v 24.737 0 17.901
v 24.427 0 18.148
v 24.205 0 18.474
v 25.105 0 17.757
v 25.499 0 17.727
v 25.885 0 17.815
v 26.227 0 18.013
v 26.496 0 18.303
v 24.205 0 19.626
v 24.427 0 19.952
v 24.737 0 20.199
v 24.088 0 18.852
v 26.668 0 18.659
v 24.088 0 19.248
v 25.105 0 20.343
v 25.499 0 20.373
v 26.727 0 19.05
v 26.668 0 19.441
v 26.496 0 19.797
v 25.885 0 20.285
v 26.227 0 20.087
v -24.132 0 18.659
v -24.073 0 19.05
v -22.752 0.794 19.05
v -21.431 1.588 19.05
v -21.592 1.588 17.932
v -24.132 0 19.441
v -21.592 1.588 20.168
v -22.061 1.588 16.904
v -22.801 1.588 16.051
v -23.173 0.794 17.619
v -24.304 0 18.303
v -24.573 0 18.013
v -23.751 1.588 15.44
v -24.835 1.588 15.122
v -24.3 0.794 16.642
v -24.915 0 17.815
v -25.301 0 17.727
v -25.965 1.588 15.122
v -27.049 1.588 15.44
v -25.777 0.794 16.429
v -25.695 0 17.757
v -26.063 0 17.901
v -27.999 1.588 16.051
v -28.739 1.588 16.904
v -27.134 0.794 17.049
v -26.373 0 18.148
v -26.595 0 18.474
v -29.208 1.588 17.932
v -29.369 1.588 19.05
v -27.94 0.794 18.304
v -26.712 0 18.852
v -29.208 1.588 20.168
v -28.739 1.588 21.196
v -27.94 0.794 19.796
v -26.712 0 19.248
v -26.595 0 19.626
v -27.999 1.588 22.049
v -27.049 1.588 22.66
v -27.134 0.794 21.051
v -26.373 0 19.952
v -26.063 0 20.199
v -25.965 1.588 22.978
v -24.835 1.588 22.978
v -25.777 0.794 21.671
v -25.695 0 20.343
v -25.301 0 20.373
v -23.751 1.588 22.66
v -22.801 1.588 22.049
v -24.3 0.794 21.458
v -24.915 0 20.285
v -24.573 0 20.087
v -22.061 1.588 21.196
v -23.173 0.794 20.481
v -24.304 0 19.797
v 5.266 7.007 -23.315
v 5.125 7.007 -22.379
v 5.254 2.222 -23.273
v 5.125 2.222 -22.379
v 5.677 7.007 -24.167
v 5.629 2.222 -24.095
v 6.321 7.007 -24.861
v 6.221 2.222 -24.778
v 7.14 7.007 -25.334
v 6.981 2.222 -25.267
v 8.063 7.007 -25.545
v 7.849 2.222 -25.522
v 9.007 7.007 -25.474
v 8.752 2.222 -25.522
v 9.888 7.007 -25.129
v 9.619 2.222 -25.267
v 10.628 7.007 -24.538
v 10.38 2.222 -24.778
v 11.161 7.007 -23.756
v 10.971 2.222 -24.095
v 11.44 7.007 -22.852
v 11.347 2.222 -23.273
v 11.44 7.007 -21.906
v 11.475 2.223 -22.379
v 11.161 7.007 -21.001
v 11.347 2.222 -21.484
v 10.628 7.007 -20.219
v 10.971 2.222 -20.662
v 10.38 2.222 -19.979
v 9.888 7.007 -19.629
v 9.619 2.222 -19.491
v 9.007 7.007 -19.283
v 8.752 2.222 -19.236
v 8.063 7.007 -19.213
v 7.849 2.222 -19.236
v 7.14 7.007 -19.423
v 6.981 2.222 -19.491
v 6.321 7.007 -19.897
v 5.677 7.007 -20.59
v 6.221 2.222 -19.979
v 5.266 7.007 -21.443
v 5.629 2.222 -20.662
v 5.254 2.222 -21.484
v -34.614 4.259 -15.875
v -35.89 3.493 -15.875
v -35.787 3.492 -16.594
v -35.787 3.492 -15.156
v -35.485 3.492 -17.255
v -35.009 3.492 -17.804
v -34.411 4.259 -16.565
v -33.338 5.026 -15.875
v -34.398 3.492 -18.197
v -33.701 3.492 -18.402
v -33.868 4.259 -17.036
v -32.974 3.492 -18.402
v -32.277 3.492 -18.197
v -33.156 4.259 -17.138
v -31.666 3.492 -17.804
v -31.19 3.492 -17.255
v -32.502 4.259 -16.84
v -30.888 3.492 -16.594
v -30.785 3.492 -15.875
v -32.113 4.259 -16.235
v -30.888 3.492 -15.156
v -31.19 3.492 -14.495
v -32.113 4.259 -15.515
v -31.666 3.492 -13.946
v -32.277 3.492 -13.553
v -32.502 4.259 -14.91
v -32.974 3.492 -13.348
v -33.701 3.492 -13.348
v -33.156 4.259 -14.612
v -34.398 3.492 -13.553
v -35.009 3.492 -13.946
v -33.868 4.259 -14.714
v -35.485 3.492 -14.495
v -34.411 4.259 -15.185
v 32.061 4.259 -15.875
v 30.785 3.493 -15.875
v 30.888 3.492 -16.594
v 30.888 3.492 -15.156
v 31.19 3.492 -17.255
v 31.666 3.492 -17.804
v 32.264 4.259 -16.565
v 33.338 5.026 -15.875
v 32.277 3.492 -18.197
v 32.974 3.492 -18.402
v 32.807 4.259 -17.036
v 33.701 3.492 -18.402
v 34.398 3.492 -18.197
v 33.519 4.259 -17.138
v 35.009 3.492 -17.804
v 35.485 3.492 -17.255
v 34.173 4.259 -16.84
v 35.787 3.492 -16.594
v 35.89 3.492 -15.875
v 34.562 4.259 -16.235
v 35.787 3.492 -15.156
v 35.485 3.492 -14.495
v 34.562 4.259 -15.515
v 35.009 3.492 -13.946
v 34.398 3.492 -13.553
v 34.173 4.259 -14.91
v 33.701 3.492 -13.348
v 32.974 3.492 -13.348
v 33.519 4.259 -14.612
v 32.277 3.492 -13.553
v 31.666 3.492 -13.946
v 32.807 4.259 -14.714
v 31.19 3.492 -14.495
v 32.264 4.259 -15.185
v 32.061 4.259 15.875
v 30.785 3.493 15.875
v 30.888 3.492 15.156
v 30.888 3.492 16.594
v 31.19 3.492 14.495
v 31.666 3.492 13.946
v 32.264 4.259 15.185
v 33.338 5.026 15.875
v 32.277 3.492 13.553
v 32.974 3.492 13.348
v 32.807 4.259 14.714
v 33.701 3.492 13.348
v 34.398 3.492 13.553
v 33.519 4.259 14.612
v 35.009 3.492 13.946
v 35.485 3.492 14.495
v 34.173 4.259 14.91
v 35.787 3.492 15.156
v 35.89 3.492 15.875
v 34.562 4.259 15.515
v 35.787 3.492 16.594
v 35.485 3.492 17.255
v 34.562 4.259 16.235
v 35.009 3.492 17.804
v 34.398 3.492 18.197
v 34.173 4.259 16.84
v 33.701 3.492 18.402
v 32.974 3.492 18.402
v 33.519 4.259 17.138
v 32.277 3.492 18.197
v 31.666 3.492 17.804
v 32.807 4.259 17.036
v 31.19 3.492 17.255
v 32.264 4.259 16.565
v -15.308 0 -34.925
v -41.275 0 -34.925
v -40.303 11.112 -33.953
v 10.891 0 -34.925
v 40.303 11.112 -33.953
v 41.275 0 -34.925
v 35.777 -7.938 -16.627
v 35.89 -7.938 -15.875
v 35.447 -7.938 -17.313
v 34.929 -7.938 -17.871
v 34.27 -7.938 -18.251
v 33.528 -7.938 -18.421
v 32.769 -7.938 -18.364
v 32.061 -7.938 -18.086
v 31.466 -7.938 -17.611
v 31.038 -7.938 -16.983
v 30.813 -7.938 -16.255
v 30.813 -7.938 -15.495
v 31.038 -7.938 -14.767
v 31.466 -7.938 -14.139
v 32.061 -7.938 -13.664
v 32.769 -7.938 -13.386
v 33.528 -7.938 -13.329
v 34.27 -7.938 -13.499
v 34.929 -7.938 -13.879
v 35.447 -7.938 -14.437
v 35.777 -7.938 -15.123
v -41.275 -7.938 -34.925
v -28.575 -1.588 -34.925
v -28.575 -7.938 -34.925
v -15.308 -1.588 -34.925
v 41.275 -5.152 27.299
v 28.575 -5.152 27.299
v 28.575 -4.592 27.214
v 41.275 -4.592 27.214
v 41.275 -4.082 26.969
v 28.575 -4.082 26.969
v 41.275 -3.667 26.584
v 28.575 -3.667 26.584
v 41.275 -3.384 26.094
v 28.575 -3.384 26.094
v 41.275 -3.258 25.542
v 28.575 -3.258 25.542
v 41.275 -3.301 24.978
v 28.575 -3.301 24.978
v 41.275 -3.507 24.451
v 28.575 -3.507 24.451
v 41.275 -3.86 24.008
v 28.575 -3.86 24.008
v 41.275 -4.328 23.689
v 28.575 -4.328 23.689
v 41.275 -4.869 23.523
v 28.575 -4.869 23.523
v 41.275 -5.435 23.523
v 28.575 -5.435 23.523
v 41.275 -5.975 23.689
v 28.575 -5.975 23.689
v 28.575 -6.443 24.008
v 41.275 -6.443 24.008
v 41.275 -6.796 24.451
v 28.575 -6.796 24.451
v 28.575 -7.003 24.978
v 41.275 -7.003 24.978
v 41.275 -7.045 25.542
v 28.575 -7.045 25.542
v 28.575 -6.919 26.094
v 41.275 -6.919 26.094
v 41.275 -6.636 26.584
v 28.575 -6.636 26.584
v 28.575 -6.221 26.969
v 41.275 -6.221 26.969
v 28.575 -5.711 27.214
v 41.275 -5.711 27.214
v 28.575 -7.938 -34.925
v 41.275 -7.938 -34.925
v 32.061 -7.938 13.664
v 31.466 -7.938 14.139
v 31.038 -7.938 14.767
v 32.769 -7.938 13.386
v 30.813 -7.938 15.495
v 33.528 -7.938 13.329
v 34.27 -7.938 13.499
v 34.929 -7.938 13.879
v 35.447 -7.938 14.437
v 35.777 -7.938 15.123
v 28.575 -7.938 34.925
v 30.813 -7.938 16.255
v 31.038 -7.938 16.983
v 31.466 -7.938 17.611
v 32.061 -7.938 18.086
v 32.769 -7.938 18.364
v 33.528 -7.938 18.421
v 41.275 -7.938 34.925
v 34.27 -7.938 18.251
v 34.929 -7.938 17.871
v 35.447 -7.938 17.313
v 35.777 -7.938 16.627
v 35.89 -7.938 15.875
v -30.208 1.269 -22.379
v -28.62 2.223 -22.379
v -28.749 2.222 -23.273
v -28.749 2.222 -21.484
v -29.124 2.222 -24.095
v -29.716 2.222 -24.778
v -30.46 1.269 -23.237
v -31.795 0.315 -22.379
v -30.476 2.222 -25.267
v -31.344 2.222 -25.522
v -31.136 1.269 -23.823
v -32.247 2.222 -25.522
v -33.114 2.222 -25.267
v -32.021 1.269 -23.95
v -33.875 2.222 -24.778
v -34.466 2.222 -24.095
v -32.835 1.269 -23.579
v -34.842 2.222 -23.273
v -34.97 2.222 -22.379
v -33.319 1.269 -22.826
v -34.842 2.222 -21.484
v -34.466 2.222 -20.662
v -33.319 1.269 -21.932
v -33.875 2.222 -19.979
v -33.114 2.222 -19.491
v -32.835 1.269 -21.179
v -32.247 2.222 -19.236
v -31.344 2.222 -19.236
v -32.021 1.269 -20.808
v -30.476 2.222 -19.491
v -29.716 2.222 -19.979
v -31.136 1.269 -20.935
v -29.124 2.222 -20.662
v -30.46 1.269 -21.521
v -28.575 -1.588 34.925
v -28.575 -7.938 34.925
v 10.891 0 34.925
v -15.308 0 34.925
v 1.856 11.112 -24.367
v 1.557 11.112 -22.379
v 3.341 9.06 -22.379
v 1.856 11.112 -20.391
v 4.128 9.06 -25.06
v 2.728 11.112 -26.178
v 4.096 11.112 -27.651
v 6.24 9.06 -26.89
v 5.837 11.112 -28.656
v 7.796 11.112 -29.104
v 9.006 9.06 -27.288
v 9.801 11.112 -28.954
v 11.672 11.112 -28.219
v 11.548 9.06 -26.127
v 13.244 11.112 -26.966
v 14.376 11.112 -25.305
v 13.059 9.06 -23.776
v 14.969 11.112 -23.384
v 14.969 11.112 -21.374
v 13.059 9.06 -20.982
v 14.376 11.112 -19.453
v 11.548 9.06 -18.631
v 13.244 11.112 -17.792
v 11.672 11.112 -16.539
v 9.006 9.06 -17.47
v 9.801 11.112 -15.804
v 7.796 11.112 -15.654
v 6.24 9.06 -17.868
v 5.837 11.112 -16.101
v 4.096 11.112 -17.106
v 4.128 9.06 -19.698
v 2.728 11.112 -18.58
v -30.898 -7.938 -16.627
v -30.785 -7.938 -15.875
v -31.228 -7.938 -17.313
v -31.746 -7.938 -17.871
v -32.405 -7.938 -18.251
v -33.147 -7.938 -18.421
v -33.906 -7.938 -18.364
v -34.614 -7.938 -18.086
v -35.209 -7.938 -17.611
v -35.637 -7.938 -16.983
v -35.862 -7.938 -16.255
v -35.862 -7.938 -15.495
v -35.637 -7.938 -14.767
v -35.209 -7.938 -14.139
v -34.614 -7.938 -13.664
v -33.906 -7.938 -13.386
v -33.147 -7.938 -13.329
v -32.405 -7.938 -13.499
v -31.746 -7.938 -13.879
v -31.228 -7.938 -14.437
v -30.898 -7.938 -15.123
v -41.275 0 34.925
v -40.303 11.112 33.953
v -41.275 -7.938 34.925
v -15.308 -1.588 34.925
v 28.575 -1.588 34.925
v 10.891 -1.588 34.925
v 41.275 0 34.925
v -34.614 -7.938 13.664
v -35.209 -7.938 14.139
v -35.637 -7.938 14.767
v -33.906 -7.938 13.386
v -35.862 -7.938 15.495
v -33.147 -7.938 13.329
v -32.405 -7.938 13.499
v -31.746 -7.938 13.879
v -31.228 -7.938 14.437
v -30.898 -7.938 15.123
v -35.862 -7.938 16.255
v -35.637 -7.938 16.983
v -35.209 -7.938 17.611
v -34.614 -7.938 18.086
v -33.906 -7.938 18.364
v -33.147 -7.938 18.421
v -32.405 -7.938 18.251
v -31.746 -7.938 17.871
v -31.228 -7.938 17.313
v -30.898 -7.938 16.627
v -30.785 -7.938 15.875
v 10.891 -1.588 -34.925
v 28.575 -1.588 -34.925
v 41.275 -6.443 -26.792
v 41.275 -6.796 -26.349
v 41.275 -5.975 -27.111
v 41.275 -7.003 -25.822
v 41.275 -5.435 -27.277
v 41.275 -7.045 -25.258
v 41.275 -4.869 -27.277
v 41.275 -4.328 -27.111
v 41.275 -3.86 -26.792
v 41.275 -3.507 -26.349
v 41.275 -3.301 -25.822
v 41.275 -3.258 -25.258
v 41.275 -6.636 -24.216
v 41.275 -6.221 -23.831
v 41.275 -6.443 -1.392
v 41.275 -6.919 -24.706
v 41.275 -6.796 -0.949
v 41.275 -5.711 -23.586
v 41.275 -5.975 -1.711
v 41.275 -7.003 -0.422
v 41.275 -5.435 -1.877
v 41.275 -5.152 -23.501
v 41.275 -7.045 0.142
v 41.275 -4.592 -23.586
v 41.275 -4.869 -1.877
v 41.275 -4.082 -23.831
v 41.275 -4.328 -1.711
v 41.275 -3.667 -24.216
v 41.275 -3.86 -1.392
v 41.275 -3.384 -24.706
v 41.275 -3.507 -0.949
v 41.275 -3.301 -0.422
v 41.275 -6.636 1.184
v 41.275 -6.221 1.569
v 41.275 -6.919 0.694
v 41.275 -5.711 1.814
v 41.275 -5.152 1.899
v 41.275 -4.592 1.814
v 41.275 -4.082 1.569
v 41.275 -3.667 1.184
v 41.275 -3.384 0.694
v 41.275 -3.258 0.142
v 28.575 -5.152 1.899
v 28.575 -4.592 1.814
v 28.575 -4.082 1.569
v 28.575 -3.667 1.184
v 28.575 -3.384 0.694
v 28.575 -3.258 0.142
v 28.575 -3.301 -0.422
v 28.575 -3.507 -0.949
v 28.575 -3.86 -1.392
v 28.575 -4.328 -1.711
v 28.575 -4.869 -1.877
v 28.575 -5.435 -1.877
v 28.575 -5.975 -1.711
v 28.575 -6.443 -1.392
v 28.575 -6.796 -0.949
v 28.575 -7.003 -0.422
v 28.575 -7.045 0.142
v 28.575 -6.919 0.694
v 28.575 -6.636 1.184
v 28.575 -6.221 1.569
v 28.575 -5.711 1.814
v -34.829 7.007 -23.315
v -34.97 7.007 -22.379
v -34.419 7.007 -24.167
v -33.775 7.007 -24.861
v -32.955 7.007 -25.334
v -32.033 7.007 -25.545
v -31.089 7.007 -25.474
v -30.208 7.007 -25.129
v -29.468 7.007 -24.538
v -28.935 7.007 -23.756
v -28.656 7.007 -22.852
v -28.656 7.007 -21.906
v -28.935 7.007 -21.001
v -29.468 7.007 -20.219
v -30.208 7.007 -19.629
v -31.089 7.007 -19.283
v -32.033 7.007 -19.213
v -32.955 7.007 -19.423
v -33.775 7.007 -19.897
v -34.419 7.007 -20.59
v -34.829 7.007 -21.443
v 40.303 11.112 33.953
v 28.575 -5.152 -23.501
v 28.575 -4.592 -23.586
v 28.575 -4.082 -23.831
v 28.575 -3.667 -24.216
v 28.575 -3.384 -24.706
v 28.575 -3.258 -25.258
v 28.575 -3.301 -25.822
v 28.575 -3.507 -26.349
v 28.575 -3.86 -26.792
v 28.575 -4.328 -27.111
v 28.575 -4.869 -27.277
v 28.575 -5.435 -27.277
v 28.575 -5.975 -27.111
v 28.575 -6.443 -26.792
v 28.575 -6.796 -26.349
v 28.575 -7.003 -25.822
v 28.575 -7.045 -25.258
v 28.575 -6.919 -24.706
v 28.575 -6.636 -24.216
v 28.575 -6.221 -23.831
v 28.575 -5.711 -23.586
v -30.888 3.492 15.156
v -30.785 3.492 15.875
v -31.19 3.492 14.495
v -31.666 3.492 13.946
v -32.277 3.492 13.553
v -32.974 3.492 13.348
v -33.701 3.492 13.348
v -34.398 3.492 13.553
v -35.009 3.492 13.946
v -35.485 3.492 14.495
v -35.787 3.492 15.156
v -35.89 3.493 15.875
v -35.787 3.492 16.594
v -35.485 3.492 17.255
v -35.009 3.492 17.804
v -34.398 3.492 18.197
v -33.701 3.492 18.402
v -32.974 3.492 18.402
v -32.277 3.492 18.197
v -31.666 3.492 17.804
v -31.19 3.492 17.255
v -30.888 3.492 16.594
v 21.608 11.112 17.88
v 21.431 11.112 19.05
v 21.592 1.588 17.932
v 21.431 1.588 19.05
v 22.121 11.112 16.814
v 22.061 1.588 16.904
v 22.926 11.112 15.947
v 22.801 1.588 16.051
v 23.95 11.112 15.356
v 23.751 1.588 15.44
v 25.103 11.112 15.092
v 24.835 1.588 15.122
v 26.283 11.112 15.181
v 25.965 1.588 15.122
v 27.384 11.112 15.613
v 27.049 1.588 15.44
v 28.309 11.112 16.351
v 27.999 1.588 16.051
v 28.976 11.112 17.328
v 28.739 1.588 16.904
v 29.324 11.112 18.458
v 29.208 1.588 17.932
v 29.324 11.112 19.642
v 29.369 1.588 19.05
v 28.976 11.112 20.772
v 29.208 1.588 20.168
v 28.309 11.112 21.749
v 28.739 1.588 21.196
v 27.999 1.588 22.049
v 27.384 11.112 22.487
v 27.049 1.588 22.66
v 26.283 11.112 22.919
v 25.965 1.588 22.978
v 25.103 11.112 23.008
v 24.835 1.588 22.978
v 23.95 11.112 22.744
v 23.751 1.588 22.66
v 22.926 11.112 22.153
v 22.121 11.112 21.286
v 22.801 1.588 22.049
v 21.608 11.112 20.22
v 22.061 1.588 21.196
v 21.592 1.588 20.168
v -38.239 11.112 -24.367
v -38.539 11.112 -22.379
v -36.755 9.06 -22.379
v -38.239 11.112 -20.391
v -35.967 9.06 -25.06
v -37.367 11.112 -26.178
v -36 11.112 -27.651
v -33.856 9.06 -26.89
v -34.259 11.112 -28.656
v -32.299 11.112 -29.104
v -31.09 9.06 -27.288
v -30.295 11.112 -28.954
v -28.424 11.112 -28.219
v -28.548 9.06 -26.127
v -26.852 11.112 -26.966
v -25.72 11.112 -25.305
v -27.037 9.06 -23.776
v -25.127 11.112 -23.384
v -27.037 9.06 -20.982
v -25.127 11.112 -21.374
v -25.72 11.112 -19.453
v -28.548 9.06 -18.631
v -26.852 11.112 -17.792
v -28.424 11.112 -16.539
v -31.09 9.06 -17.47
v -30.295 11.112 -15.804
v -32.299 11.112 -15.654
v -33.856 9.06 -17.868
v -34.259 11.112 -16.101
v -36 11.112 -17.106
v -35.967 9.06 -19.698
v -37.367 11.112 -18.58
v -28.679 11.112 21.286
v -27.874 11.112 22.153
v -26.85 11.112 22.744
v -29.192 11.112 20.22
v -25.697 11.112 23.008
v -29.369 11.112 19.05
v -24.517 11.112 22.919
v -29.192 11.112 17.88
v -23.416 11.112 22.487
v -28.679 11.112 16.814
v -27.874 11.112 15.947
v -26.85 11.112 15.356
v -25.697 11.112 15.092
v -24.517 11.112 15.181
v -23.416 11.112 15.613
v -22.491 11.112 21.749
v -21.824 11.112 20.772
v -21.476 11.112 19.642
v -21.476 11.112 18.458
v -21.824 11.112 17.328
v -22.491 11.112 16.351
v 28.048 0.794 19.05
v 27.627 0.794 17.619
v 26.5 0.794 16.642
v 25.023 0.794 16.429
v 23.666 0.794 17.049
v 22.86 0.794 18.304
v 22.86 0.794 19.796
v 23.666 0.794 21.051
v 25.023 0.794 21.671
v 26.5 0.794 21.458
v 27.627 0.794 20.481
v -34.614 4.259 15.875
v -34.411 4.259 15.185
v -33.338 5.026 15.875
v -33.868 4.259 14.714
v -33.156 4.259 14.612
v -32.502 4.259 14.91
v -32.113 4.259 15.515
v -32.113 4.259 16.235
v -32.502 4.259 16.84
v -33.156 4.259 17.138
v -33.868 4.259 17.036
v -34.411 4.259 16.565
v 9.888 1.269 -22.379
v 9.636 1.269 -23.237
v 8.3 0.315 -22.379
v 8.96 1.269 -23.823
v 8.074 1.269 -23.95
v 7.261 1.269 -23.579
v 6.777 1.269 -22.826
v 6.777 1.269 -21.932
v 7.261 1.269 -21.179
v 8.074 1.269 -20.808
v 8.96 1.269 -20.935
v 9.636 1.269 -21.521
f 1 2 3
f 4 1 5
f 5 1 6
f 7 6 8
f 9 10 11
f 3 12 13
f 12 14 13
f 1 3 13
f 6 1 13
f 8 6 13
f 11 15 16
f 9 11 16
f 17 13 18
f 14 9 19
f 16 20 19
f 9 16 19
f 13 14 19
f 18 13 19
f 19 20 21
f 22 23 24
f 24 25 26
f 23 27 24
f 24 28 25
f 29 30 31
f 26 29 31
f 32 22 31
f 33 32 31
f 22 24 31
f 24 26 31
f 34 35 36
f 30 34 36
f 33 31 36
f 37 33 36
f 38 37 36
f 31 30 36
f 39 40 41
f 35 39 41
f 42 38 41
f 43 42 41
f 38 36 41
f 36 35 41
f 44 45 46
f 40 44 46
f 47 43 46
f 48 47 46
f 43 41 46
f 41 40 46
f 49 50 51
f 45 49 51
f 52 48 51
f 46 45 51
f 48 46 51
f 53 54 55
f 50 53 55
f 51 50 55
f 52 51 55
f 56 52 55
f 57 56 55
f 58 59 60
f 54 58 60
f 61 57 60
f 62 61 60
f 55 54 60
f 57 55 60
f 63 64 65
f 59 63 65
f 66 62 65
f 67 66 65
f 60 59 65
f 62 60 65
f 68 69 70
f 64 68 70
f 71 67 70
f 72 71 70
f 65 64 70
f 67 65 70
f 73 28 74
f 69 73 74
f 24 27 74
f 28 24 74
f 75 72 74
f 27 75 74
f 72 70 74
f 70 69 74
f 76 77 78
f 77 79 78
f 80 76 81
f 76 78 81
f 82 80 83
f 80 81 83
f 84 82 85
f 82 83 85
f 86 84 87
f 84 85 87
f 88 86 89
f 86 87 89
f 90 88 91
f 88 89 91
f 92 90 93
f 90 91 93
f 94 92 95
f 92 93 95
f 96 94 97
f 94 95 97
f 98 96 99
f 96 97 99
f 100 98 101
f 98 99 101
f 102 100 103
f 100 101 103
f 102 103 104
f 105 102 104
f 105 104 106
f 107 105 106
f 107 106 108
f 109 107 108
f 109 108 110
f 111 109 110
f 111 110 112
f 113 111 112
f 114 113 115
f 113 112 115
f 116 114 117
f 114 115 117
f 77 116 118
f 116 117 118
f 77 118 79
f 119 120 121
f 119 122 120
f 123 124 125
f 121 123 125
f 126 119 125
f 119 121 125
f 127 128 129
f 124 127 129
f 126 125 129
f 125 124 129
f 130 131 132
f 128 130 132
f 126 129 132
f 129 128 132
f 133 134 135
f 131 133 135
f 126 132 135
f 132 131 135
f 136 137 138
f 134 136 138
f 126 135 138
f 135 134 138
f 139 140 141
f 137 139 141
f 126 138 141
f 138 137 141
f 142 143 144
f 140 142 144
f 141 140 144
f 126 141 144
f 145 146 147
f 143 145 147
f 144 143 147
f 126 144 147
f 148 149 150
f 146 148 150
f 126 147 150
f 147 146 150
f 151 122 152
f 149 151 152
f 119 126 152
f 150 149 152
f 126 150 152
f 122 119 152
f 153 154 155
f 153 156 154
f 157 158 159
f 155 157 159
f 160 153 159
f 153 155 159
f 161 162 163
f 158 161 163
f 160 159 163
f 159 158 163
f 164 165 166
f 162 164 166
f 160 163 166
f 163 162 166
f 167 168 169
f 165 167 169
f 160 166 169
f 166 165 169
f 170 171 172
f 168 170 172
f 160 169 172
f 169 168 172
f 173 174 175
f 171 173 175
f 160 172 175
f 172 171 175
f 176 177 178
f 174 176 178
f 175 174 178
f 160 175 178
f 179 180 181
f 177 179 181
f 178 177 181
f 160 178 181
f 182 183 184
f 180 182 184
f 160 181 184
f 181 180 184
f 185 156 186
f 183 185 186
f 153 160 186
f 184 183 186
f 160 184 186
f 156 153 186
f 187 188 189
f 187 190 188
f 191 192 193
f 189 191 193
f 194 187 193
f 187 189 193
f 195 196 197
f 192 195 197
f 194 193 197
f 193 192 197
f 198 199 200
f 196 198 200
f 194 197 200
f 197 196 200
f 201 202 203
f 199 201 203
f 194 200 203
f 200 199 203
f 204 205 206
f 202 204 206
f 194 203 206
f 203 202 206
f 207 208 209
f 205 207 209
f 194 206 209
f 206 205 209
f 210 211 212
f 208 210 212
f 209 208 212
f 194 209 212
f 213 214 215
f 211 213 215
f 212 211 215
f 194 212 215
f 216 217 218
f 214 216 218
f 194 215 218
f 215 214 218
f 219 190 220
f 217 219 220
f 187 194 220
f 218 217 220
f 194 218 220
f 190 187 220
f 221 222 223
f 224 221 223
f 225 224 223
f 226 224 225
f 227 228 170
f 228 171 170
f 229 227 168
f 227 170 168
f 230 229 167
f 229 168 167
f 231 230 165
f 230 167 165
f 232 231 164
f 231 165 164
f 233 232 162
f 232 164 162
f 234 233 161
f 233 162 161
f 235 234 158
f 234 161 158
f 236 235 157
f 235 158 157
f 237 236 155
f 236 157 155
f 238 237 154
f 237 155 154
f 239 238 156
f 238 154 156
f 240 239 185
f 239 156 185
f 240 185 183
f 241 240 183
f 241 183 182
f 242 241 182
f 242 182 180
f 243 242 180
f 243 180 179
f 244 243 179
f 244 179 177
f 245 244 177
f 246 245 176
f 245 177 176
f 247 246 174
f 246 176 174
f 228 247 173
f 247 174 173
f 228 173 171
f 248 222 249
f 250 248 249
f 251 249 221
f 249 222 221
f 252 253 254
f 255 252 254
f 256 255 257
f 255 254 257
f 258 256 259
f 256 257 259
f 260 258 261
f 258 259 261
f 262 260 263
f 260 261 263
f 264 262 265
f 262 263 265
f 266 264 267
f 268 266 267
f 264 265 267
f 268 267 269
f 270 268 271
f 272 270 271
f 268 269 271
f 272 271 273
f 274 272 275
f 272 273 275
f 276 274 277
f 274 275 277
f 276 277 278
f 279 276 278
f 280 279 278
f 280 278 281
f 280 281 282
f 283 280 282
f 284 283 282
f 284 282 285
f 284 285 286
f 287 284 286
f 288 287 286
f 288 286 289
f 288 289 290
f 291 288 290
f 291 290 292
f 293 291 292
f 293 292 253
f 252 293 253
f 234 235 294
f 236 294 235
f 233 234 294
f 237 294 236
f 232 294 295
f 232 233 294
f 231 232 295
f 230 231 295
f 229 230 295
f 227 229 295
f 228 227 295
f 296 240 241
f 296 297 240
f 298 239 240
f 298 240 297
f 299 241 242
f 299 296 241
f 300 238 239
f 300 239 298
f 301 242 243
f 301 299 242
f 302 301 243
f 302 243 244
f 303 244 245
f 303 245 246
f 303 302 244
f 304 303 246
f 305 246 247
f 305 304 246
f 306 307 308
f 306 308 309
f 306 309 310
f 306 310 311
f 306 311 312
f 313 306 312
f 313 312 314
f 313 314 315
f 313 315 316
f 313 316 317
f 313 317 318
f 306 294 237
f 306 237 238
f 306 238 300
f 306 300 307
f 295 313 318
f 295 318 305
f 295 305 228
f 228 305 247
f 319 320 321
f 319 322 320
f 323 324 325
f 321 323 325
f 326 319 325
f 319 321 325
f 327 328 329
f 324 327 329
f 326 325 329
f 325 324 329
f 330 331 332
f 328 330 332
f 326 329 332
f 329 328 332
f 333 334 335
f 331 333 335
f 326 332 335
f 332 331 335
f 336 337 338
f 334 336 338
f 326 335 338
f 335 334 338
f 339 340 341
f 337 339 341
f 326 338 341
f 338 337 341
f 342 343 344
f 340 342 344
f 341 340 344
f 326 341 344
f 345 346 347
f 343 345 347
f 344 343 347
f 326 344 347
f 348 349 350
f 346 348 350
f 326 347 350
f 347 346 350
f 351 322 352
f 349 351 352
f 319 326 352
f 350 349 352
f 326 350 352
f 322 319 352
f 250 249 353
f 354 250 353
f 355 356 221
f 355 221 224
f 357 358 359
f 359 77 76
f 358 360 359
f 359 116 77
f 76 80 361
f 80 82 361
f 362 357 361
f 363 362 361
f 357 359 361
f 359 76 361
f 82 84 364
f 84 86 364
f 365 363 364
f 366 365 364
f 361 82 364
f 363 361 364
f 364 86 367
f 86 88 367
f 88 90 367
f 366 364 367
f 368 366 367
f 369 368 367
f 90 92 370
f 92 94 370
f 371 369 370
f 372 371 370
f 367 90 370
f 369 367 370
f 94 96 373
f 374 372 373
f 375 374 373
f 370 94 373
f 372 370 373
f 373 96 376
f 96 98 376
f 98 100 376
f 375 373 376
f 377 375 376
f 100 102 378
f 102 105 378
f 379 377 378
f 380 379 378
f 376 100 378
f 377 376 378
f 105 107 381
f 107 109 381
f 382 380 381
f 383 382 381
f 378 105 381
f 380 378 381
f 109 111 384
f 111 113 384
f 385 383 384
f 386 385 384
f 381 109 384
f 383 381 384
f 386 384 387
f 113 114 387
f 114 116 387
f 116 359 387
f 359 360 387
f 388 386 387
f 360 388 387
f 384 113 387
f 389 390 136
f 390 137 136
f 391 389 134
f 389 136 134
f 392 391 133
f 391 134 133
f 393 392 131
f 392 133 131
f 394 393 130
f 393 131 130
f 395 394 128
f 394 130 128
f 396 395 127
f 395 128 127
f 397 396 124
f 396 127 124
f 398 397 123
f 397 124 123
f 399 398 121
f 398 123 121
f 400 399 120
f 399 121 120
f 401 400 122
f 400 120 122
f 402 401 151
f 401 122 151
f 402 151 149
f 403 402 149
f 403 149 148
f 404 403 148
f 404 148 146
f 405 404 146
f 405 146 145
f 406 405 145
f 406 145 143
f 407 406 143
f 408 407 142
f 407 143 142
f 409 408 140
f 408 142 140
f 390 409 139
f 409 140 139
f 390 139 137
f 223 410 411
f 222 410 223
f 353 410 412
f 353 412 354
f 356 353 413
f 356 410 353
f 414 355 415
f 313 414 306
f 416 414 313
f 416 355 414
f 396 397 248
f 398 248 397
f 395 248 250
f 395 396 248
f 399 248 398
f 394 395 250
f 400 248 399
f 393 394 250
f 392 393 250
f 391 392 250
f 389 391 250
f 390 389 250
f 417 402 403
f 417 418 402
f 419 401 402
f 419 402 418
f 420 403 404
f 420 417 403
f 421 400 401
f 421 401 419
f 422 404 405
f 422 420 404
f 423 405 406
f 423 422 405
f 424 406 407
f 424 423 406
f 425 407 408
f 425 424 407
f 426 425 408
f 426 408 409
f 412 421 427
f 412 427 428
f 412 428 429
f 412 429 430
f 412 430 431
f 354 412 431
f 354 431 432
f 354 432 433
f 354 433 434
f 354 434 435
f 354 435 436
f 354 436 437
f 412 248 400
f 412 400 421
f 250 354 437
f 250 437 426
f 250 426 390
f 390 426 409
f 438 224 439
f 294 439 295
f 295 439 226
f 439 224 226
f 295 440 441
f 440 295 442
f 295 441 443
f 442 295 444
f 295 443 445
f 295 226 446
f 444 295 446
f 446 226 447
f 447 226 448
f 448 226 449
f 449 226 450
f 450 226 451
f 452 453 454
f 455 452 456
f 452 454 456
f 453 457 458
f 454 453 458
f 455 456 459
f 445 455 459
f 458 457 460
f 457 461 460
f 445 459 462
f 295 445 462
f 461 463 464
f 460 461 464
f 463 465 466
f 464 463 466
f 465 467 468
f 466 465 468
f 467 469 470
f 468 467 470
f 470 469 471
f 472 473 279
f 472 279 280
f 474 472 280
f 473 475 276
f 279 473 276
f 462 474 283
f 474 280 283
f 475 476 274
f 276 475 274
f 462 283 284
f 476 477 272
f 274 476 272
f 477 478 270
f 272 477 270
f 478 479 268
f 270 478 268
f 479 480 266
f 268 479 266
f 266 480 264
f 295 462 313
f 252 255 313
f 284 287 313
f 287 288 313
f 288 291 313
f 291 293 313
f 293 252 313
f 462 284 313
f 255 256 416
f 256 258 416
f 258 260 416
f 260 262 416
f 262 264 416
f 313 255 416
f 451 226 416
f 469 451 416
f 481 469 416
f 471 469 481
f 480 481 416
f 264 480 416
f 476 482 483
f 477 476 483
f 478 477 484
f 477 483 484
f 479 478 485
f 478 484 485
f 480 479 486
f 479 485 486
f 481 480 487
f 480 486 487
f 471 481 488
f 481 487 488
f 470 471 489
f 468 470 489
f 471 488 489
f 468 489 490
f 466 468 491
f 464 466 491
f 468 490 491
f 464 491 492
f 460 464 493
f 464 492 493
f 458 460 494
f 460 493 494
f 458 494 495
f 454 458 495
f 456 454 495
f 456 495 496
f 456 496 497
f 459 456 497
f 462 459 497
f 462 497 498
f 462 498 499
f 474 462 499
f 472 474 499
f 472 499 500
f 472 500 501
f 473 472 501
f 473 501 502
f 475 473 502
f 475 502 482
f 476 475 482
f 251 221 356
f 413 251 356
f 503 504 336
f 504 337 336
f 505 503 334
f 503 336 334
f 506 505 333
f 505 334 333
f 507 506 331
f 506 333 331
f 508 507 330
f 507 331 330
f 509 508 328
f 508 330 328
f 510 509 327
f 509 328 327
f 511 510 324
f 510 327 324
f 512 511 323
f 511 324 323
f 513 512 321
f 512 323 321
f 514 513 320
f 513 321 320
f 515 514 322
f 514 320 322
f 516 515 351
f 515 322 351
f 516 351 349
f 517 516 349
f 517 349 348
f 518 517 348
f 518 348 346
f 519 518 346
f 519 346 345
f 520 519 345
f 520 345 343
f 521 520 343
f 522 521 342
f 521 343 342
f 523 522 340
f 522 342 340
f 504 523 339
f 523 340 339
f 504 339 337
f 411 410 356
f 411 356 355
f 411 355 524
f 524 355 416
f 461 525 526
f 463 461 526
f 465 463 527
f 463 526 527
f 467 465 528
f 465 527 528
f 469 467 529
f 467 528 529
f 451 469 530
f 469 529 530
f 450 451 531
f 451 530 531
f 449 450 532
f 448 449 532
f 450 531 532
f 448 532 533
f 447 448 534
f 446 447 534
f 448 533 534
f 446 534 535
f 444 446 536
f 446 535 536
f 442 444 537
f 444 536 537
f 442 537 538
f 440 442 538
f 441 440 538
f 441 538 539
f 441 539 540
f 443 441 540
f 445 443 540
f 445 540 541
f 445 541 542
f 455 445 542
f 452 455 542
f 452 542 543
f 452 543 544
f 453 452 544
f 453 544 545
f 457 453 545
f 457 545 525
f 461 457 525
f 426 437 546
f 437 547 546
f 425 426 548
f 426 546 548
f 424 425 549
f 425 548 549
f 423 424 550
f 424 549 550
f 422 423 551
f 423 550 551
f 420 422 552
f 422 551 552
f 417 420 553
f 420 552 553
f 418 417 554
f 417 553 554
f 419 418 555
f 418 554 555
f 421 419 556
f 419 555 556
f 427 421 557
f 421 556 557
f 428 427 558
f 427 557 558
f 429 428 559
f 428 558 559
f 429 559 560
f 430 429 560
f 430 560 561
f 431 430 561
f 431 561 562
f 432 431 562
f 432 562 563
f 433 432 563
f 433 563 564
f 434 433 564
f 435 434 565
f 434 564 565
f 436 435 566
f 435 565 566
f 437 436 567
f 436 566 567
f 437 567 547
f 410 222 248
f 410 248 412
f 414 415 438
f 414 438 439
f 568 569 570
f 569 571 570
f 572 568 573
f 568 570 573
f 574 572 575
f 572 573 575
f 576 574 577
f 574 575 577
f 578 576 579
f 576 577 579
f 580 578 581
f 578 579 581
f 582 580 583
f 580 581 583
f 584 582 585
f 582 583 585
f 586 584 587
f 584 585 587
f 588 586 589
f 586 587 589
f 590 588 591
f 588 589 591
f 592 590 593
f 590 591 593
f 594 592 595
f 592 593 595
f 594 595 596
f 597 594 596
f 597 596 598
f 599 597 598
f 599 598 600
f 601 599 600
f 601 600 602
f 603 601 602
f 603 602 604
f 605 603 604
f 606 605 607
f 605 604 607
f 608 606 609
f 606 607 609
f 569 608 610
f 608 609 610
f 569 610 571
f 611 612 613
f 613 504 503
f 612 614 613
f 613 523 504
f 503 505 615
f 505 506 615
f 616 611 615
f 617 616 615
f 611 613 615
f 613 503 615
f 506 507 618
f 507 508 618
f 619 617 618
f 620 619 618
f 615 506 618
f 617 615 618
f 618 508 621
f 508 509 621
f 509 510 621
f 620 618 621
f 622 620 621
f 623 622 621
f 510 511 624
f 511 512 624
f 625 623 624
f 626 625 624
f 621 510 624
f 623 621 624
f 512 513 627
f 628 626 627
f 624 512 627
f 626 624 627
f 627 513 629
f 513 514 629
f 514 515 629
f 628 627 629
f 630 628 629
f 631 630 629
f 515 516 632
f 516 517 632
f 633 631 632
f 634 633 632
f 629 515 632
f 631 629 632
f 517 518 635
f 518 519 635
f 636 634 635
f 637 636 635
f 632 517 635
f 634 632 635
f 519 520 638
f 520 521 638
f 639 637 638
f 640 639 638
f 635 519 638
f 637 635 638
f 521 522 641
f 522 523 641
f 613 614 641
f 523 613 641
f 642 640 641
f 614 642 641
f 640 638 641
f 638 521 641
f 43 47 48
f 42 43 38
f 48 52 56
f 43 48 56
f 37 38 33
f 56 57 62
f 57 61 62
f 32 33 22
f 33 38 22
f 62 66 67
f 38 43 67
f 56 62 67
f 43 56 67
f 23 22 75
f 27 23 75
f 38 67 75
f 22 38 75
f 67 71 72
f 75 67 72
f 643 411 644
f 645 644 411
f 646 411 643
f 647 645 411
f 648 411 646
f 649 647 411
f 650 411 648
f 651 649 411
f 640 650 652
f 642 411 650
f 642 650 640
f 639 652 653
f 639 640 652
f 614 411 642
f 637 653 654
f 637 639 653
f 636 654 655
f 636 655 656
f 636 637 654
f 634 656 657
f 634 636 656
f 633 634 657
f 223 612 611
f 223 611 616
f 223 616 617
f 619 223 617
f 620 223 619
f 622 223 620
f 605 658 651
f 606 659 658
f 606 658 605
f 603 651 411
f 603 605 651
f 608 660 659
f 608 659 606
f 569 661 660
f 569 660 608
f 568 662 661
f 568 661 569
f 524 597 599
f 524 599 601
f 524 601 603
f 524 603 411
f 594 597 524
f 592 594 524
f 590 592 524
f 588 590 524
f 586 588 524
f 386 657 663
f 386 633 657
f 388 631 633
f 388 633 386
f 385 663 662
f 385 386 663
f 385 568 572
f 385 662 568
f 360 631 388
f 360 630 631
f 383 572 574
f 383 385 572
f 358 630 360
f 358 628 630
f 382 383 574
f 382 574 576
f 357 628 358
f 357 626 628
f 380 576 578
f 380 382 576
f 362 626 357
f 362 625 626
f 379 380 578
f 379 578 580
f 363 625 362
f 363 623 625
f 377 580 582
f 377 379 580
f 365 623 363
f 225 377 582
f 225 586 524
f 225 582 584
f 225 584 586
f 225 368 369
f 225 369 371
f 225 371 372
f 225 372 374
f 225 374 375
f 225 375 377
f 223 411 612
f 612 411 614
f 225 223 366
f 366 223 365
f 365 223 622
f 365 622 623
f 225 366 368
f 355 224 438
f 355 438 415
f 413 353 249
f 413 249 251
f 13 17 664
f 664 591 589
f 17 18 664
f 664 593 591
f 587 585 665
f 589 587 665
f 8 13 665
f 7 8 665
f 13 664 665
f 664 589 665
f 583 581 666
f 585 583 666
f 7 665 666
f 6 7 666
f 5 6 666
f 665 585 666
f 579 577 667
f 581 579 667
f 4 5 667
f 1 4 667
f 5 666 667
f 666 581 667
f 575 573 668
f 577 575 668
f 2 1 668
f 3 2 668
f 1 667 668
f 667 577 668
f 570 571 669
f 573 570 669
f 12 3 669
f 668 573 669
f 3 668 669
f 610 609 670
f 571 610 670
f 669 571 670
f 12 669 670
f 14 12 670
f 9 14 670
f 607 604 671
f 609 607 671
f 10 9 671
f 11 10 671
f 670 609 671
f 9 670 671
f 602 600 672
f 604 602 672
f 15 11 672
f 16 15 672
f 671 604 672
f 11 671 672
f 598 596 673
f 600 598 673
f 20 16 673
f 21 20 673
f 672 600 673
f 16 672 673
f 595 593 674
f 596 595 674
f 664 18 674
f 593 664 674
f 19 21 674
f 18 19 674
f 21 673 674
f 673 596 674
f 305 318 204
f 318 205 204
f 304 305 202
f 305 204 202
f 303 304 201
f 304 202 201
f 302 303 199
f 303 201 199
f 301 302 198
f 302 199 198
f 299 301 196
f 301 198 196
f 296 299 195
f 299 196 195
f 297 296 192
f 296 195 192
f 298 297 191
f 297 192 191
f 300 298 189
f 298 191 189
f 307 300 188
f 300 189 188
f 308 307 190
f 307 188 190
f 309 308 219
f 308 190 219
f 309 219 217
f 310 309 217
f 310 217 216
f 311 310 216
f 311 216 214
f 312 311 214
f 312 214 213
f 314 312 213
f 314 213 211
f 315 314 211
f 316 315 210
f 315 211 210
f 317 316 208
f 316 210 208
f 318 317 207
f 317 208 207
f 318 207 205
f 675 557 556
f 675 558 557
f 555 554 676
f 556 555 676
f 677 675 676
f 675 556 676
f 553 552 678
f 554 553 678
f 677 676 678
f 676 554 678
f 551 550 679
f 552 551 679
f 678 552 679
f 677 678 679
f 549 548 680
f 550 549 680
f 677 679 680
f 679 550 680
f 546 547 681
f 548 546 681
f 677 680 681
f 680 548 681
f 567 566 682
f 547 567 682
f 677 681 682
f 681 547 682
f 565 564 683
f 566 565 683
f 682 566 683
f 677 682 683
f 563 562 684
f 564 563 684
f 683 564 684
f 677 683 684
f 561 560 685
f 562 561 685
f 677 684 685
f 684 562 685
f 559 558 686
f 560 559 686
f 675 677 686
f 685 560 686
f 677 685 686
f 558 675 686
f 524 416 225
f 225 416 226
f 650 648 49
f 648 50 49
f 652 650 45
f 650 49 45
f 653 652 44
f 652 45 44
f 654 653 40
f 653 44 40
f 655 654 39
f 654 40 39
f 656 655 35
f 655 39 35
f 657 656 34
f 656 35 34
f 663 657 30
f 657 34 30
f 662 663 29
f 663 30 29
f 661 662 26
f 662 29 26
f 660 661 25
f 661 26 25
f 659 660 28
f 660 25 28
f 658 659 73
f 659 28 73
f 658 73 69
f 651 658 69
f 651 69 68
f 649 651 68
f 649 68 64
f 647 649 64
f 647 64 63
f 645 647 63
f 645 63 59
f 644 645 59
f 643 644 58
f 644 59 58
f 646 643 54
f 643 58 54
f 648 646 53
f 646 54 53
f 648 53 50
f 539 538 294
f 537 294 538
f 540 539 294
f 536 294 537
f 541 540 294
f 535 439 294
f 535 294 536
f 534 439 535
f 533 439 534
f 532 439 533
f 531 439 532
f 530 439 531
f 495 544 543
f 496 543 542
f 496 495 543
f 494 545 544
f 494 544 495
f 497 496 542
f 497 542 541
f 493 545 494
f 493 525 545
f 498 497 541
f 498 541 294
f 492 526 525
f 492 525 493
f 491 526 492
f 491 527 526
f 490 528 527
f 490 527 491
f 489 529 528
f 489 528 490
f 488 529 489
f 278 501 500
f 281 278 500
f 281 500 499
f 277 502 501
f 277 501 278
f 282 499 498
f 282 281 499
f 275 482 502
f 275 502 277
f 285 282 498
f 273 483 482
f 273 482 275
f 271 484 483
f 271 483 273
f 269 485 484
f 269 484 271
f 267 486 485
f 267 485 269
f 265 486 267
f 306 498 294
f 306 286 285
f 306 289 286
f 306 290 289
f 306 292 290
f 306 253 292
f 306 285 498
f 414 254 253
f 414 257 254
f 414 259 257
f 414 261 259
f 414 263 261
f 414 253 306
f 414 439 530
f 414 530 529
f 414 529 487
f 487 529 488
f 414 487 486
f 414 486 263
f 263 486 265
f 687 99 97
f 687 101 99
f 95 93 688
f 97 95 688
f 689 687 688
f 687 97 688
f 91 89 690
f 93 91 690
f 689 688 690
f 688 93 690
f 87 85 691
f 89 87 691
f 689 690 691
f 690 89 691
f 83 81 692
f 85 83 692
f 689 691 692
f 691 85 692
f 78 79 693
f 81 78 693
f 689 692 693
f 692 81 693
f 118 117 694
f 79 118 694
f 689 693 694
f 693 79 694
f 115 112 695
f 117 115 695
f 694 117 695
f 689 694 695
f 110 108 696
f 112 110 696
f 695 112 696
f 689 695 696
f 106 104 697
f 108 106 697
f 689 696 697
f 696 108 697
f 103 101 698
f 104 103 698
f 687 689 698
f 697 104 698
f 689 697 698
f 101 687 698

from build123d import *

# Parameters (mm, degrees)
SKETCH1_W                             = 82.55
SKETCH1_H                             = 69.85
BOSS_EXTRUDE1_DEPTH                   = 7.9375
SKETCH2_W                             = 82.55
SKETCH2_H                             = 69.85
BOSS_EXTRUDE2_DEPTH                   = 3.175
F_3_8_16_TAPPED_HOLE1_D               = 7.9375
F_3_8_16_TAPPED_HOLE1_DEPTH           = 9.525
F_3_8_16_TAPPED_HOLE1_TIP             = 2.384665582
DRAFT1_ANGLE                          = 5
SKETCH3_W                             = 12.7
SKETCH3_H                             = 69.85
BOSS_EXTRUDE3_DEPTH                   = 7.9375
SKETCH4_W                             = 13.267261336
SKETCH4_H                             = 69.85
SKETCH4_W_2                           = 17.684109612
WEAR_PADS_DEPTH                       = 1.5875
F_10_24_TAPPED_HOLE1_D                = 3.7973
F_10_24_TAPPED_HOLE1_DEPTH            = 12.7
F_1_4_0_25_DIAMETER_HOLE1_D           = 6.35
F_1_4_0_25_DIAMETER_HOLE1_DEPTH       = 8.89
F_1_4_0_25_DIAMETER_HOLE1_CSINK_D     = 13.4874
F_1_4_0_25_DIAMETER_HOLE1_CSINK_ANGLE = 82
F_1_4_0_25_DIAMETER_HOLE1_TIP         = 1.907732465
F_1_4_20_TAPPED_HOLE1_D               = 5.1054
F_1_4_20_TAPPED_HOLE1_DEPTH           = 11.43
F_1_4_20_TAPPED_HOLE1_TIP             = 1.533816902
F_1_4_20_TAPPED_HOLE2_D               = 5.1054
F_1_4_20_TAPPED_HOLE2_DEPTH           = 11.43
F_1_4_20_TAPPED_HOLE2_TIP             = 1.533816902


with BuildPart() as part:
    # Sketch1 → Boss-Extrude1 (new body)
    with BuildSketch(Plane(origin=(0, 0, 0), x_dir=(1, 0, 0), z_dir=(0, 1, 0))):
        Rectangle(SKETCH1_W, SKETCH1_H)
    extrude(amount=BOSS_EXTRUDE1_DEPTH)

    # Sketch2 → Boss-Extrude2 (add)
    with BuildSketch(Plane(origin=(0, 7.9375, 0), x_dir=(1, 0, 0), z_dir=(0, 1, 0))):
        Rectangle(SKETCH2_W, SKETCH2_H)
    extrude(amount=BOSS_EXTRUDE2_DEPTH)

    # 3/8-16 Tapped Hole1
    with Locations(Plane(origin=(0, 11.1125, 0), x_dir=(1, 0, 0), z_dir=(0, 1, 0))):
        with Locations((-25.4, -19.05), (25.4, -19.05)):
            Hole(F_3_8_16_TAPPED_HOLE1_D / 2, depth=F_3_8_16_TAPPED_HOLE1_DEPTH)
            with Locations((0, 0, -(F_3_8_16_TAPPED_HOLE1_DEPTH + F_3_8_16_TAPPED_HOLE1_TIP / 2))):  # 118° drill point
                Cone(0, F_3_8_16_TAPPED_HOLE1_D / 2, F_3_8_16_TAPPED_HOLE1_TIP, mode=Mode.SUBTRACT)

    # Draft1
    draft1_faces = [part.faces().sort_by_distance(p)[0] for p in [
        (0, 5.55625, -34.925),
        (-41.275, 5.55625, 0),
        (0, 5.55625, 34.925),
        (41.275, 5.55625, 0),
    ]]
    draft(draft1_faces, Plane.ZX, DRAFT1_ANGLE)

    # Sketch3 → Boss-Extrude3 (add)
    with BuildSketch(Plane.XZ):
        with Locations((34.925, 0)):
            Rectangle(SKETCH3_W, SKETCH3_H)
        with Locations((-34.925, 0)):
            Rectangle(SKETCH3_W, SKETCH3_H)
    extrude(amount=BOSS_EXTRUDE3_DEPTH)

    # Sketch4 → Wear Pads (add)
    with BuildSketch(Plane.XZ):
        with Locations((-21.941369332, 0)):
            Rectangle(SKETCH4_W, SKETCH4_H)
        with Locations((19.732945194, 0)):
            Rectangle(SKETCH4_W_2, SKETCH4_H)
    extrude(amount=WEAR_PADS_DEPTH)

    # #10-24 Tapped Hole1
    with Locations(Plane(origin=(41.275, 0, 0), x_dir=(0, 0, -1), z_dir=(1, 0, 0))):
        with Locations((-25.4, -5.151627132), (25.4, -5.151627132), (0, -5.151627132)):
            Hole(F_10_24_TAPPED_HOLE1_D / 2, depth=F_10_24_TAPPED_HOLE1_DEPTH)

    # 1/4 (0.25) Diameter Hole1
    with Locations(Plane(origin=(0, 11.1125, 0), x_dir=(1, 0, 0), z_dir=(0, 1, 0))):
        with Locations((-31.795373704, 22.378883405), (8.300402943, 22.378883405)):
            CounterSinkHole(F_1_4_0_25_DIAMETER_HOLE1_D / 2, F_1_4_0_25_DIAMETER_HOLE1_CSINK_D / 2, depth=F_1_4_0_25_DIAMETER_HOLE1_DEPTH, counter_sink_angle=F_1_4_0_25_DIAMETER_HOLE1_CSINK_ANGLE)
            with Locations((0, 0, -(F_1_4_0_25_DIAMETER_HOLE1_DEPTH + F_1_4_0_25_DIAMETER_HOLE1_TIP / 2))):  # 118° drill point
                Cone(0, F_1_4_0_25_DIAMETER_HOLE1_D / 2, F_1_4_0_25_DIAMETER_HOLE1_TIP, mode=Mode.SUBTRACT)

    # 1/4-20 Tapped Hole1
    with Locations(Plane(origin=(0, -7.9375, 0), x_dir=(-1, 0, 0), z_dir=(0, -1, 0))):
        with Locations((-33.3375, 15.875), (-33.3375, -15.875)):
            Hole(F_1_4_20_TAPPED_HOLE1_D / 2, depth=F_1_4_20_TAPPED_HOLE1_DEPTH)
            with Locations((0, 0, -(F_1_4_20_TAPPED_HOLE1_DEPTH + F_1_4_20_TAPPED_HOLE1_TIP / 2))):  # 118° drill point
                Cone(0, F_1_4_20_TAPPED_HOLE1_D / 2, F_1_4_20_TAPPED_HOLE1_TIP, mode=Mode.SUBTRACT)

    # 1/4-20 Tapped Hole2
    with Locations(Plane(origin=(0, -7.9375, 0), x_dir=(-1, 0, 0), z_dir=(0, -1, 0))):
        with Locations((33.3375, -15.875), (33.3375, 15.875)):
            Hole(F_1_4_20_TAPPED_HOLE2_D / 2, depth=F_1_4_20_TAPPED_HOLE2_DEPTH)
            with Locations((0, 0, -(F_1_4_20_TAPPED_HOLE2_DEPTH + F_1_4_20_TAPPED_HOLE2_TIP / 2))):  # 118° drill point
                Cone(0, F_1_4_20_TAPPED_HOLE2_D / 2, F_1_4_20_TAPPED_HOLE2_TIP, mode=Mode.SUBTRACT)


solid = part.part
